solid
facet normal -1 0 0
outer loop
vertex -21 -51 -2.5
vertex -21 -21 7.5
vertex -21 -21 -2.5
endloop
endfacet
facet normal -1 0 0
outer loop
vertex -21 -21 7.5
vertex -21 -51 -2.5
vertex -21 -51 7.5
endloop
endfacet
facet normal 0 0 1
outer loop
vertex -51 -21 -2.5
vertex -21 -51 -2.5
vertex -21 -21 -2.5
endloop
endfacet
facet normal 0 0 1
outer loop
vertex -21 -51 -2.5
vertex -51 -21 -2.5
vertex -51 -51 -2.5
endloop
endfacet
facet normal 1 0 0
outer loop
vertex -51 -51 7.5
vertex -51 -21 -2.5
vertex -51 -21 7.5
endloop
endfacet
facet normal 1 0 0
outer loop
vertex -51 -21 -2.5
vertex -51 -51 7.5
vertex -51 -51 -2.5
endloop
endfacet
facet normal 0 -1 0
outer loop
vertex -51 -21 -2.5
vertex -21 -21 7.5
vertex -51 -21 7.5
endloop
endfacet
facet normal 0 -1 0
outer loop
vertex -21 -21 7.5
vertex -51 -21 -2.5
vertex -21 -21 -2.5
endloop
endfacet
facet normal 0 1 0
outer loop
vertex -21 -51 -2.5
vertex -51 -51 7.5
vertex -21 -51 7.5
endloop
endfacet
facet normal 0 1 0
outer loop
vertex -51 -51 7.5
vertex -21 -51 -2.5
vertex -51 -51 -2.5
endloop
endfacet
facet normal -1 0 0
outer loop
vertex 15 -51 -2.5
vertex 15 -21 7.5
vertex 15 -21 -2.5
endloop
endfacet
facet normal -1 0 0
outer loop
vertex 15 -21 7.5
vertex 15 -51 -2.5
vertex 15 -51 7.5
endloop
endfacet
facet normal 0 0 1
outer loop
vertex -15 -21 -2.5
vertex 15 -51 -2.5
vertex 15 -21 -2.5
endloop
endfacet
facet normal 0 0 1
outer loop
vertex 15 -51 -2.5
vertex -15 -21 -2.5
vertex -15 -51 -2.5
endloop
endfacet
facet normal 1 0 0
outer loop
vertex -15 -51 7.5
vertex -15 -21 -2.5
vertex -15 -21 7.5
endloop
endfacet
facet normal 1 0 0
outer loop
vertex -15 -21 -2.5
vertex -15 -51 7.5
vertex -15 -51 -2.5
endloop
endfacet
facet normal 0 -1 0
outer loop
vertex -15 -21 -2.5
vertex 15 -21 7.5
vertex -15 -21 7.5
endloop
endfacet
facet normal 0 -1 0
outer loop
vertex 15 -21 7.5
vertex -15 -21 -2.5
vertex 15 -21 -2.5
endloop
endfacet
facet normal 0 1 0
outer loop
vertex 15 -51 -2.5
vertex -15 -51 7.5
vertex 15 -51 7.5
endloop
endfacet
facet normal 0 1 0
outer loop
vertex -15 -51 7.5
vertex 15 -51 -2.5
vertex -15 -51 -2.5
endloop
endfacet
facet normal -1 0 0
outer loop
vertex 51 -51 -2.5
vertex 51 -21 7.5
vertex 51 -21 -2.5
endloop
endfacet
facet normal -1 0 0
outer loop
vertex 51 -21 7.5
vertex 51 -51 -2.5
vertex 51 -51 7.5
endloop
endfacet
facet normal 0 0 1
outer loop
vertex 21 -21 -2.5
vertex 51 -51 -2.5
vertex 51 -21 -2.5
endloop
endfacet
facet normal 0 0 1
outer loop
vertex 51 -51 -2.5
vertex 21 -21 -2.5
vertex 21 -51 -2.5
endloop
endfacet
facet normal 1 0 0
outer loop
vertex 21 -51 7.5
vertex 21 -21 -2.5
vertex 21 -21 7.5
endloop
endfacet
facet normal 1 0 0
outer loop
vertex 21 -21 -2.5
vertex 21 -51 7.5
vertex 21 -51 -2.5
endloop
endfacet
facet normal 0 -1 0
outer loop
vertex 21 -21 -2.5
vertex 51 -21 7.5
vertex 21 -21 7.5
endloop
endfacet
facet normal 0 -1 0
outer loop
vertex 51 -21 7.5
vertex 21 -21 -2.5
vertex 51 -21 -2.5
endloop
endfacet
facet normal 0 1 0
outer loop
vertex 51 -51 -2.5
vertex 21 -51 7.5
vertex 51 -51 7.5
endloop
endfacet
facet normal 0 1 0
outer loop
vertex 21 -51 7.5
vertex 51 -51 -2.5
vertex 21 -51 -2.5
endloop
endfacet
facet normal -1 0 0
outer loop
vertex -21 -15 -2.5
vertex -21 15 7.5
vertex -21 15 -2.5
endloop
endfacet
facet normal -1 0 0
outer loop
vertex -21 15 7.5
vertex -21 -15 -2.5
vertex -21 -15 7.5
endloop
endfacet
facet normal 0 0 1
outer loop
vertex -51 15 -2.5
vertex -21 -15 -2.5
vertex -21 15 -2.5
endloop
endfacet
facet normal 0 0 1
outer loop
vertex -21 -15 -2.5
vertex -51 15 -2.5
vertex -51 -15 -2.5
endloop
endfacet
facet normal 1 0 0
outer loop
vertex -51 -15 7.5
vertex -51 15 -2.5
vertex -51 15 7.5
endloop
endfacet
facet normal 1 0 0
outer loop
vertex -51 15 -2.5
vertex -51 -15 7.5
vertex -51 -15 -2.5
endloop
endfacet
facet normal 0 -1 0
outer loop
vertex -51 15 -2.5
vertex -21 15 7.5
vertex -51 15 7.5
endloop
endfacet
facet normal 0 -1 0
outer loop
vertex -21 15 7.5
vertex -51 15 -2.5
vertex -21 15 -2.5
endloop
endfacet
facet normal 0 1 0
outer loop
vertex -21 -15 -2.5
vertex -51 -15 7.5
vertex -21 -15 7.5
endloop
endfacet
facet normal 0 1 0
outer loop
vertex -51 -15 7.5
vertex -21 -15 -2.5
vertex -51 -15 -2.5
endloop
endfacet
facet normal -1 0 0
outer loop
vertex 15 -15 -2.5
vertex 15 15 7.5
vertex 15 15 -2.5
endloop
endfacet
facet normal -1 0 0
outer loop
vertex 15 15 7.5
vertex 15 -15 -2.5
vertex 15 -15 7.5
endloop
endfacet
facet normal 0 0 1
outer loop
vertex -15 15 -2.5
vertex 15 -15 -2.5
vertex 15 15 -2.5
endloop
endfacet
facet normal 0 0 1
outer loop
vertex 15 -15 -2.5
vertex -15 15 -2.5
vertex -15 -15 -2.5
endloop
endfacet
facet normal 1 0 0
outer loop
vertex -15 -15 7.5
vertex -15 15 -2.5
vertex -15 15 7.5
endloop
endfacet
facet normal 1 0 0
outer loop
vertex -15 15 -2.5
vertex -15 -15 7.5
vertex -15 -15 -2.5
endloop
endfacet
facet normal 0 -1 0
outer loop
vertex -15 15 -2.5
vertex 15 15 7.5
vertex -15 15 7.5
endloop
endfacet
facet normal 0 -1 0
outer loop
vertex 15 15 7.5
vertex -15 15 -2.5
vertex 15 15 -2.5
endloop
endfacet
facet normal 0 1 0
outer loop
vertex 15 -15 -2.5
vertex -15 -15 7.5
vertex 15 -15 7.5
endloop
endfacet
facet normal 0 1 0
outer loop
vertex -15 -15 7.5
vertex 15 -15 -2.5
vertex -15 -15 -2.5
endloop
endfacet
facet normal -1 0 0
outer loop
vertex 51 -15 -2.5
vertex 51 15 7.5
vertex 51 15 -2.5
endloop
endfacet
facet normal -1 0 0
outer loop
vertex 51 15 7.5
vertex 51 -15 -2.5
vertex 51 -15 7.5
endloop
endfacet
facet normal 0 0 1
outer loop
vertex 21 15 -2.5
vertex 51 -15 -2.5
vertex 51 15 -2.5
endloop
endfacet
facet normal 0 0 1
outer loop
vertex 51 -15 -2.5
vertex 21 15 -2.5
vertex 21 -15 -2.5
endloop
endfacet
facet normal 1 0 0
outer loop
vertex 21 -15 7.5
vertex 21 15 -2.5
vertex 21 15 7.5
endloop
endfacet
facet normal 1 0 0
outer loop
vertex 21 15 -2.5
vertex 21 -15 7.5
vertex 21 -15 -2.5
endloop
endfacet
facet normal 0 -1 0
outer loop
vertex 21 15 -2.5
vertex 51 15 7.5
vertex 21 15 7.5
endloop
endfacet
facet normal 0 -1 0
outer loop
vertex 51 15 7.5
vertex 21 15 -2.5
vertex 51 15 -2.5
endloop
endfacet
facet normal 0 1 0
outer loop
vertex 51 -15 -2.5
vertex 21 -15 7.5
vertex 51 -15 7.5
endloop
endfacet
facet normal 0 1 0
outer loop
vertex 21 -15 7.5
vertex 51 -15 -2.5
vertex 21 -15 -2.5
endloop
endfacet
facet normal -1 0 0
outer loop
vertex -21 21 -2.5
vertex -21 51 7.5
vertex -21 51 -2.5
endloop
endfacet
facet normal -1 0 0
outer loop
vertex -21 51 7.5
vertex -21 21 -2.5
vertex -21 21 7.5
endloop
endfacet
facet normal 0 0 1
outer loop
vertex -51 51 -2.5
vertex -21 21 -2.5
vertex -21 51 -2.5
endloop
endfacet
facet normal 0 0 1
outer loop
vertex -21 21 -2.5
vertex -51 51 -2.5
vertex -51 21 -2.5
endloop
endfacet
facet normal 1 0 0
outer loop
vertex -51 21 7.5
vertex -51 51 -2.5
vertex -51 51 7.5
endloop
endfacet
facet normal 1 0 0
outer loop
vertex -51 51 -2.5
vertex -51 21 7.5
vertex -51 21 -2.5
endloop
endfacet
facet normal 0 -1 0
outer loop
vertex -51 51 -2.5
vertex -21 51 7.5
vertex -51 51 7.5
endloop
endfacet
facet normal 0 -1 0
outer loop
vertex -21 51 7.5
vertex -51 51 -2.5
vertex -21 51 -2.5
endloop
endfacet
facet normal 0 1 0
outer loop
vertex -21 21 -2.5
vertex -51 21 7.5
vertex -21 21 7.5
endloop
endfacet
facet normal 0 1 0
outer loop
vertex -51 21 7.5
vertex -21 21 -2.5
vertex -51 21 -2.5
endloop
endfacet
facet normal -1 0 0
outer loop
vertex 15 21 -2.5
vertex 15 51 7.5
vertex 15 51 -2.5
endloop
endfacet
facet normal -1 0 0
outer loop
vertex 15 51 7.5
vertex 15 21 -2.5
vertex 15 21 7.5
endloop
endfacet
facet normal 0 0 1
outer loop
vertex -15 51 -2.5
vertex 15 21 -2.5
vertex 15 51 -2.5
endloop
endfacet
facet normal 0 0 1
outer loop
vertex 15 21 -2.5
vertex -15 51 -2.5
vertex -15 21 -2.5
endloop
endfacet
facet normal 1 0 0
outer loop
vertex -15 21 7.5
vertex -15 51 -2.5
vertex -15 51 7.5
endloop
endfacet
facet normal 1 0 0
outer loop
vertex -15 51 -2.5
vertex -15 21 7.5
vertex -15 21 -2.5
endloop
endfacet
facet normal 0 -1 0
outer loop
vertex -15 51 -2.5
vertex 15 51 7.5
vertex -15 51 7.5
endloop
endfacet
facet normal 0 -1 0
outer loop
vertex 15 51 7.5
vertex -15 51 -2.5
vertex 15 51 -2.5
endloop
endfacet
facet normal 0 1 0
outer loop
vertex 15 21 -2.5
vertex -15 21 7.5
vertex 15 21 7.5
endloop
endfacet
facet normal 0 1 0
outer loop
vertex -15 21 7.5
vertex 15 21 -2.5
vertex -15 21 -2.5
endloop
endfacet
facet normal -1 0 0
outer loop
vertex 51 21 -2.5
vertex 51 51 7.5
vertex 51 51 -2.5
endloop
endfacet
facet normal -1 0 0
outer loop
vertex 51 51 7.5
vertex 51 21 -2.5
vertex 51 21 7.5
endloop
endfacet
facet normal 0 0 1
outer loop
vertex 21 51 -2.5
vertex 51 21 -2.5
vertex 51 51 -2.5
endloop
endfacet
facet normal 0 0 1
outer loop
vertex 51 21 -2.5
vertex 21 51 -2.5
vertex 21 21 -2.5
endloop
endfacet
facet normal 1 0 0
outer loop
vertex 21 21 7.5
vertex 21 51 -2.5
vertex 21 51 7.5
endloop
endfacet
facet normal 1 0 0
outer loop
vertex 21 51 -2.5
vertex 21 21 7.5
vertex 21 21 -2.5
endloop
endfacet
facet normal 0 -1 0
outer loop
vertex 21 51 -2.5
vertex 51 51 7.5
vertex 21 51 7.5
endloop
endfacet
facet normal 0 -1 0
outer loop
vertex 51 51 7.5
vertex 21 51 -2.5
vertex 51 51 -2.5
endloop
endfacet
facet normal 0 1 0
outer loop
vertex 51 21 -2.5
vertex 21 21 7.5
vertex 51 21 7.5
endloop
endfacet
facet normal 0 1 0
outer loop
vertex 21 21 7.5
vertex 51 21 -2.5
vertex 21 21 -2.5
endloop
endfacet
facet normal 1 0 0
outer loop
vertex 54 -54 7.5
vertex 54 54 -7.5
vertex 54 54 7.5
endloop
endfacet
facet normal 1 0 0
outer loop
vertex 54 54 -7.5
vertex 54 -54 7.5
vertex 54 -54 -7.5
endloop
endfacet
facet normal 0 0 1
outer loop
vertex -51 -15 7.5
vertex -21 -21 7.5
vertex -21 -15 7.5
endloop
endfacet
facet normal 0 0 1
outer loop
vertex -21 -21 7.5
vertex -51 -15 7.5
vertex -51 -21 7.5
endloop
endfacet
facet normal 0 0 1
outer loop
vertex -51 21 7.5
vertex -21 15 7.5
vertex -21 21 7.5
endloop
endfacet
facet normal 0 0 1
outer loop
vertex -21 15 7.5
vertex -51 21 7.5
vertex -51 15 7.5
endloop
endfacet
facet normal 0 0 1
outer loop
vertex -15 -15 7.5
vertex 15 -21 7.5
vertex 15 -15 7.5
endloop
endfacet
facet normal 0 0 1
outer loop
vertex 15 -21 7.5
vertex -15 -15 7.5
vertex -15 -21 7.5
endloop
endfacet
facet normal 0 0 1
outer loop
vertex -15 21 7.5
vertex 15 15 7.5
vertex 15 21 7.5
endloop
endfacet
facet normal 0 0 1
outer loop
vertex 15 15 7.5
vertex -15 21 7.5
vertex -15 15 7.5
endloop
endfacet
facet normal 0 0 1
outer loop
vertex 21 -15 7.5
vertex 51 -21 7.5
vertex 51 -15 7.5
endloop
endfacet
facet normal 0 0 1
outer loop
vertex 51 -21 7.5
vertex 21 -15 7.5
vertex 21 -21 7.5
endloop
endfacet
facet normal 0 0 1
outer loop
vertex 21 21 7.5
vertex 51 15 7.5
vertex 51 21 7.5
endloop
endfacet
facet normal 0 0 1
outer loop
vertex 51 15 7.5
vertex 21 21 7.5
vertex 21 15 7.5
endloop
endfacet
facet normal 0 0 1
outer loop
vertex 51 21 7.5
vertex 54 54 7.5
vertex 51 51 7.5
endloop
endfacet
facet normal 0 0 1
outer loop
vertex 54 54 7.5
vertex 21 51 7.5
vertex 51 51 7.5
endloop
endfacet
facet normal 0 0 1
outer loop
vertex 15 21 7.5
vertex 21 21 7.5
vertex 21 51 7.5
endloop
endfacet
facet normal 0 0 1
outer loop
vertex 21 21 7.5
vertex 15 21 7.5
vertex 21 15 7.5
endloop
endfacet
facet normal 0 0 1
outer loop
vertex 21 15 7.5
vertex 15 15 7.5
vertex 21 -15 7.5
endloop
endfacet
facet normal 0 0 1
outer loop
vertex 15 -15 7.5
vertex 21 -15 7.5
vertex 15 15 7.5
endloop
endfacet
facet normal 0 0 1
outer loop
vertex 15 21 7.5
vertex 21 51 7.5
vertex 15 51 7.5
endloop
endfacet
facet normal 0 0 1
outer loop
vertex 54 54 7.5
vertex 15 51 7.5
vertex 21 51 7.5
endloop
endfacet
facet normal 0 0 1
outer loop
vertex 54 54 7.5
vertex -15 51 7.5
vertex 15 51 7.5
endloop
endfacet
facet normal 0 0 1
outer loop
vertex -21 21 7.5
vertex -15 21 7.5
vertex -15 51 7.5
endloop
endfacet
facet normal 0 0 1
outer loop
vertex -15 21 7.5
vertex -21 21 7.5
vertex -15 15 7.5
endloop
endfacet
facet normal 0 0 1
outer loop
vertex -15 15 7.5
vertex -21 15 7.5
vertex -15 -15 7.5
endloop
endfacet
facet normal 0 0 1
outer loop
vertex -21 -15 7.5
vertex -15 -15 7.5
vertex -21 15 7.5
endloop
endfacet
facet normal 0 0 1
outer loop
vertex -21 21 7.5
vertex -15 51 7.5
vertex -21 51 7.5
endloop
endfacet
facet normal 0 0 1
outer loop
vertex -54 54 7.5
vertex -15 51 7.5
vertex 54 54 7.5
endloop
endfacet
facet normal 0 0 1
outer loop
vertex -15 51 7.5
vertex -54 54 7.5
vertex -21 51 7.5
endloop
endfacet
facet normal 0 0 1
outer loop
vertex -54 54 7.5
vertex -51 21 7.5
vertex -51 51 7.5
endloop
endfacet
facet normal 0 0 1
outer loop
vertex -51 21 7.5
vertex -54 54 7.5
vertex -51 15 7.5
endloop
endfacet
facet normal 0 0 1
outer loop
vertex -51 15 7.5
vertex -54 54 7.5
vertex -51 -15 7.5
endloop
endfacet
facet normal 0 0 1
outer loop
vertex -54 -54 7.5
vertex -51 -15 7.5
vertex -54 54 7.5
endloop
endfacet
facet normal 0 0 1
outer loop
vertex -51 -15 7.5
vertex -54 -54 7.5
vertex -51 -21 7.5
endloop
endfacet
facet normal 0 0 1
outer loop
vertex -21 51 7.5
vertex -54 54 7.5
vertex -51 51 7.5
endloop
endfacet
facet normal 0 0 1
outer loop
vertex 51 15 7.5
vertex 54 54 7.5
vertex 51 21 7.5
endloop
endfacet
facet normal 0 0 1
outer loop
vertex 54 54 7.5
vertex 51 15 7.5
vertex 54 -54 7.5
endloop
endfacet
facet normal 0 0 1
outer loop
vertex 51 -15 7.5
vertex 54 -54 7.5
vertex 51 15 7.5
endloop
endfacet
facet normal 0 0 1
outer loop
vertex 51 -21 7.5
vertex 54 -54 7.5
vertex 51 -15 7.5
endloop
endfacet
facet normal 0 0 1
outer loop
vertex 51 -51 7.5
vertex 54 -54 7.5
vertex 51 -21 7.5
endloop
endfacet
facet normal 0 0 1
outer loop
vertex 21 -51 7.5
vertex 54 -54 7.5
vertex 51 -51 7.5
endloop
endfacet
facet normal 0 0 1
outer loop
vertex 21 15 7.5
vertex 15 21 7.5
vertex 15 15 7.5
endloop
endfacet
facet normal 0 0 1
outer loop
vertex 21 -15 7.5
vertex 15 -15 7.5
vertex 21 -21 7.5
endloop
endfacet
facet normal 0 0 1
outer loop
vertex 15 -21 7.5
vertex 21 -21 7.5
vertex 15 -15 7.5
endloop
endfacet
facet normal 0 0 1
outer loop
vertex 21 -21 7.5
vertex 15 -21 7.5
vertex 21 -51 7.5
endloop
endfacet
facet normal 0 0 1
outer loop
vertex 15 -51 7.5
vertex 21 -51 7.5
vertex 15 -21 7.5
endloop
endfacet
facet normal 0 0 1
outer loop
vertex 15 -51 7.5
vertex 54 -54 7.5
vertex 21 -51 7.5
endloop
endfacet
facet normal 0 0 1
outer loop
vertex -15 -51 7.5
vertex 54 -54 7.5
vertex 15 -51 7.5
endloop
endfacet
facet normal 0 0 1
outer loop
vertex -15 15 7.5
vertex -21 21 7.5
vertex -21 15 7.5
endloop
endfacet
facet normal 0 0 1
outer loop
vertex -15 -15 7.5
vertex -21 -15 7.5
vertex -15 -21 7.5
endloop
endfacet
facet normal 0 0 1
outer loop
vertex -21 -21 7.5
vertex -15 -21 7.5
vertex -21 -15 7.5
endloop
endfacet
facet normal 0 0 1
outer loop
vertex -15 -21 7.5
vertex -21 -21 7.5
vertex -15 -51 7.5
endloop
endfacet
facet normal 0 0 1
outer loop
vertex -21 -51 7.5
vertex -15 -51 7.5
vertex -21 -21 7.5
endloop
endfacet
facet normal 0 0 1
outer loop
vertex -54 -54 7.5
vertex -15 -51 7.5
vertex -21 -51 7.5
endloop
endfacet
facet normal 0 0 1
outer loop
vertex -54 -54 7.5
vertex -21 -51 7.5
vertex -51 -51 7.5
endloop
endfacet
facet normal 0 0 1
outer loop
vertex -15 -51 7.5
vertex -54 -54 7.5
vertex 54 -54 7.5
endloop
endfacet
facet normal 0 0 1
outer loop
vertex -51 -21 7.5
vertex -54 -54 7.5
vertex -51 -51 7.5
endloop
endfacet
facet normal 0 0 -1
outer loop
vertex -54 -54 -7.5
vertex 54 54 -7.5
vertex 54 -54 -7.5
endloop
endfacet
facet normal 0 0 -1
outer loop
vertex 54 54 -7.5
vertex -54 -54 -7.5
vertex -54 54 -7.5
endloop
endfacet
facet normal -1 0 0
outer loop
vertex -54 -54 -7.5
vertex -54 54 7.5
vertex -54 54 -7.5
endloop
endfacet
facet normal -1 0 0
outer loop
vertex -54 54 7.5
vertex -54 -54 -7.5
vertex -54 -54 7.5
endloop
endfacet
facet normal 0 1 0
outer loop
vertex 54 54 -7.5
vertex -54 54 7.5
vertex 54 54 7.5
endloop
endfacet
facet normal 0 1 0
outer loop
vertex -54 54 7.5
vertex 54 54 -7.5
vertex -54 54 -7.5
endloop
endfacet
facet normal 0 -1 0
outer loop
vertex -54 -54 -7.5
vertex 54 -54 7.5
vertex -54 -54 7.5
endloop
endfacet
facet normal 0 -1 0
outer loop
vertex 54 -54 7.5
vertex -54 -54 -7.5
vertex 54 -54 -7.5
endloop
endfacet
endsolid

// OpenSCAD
$fn = 32;

// ----------------------------------------------------------------------
// Pocket plate 108 x 108 x 15
// 3 x 3 pockets 30 mm square, 10 mm deep
// ----------------------------------------------------------------------

// --- parameters (mm) ---
thickness = 15;  // plate thickness
floor_t = 5;     // material left under each pocket
pocket = 30;     // pocket side length
pitch_x = 36;    // pocket pitch along X
pitch_y = 36;    // pocket pitch along Y
cols = 3;        // pockets per row
rows = 3;        // rows of pockets

// --- derived feature positions (mm) ---
depth = thickness - floor_t;        // = 10   pocket depth, down to the floor
span_x = (cols - 1) * pitch_x;      // = 72   distance between outer pockets
span_y = (rows - 1) * pitch_y;      // = 72   distance between outer pocket rows
origin_x = -span_x / 2;             // = -36   X of the first pocket
origin_y = -span_y / 2;             // = -36   Y of the first pocket
plate = [span_x + pocket + 6, span_y + pocket + 6, thickness];  // = [108, 108, 15]   overall size: pockets plus 3 mm of wall on each side
feature_centers = [
  [origin_x + 0 * pitch_x, origin_y + 0 * pitch_y],
  [origin_x + 1 * pitch_x, origin_y + 0 * pitch_y],
  [origin_x + 2 * pitch_x, origin_y + 0 * pitch_y],
  [origin_x + 0 * pitch_x, origin_y + 1 * pitch_y],
  [origin_x + 1 * pitch_x, origin_y + 1 * pitch_y],
  [origin_x + 2 * pitch_x, origin_y + 1 * pitch_y],
  [origin_x + 0 * pitch_x, origin_y + 2 * pitch_y],
  [origin_x + 1 * pitch_x, origin_y + 2 * pitch_y],
  [origin_x + 2 * pitch_x, origin_y + 2 * pitch_y]
];   // pocket centres, used verbatim by the cutter loop

// plate outline, then one pocket per centre in feature_centers
difference() {
  cube(plate, center = true);
  for (centre = feature_centers)
    translate([centre[0] - pocket / 2, centre[1] - pocket / 2, plate[2] / 2 - depth])
      cube([pocket, pocket, depth + 1]);  // centred on the declared pocket centre
}
